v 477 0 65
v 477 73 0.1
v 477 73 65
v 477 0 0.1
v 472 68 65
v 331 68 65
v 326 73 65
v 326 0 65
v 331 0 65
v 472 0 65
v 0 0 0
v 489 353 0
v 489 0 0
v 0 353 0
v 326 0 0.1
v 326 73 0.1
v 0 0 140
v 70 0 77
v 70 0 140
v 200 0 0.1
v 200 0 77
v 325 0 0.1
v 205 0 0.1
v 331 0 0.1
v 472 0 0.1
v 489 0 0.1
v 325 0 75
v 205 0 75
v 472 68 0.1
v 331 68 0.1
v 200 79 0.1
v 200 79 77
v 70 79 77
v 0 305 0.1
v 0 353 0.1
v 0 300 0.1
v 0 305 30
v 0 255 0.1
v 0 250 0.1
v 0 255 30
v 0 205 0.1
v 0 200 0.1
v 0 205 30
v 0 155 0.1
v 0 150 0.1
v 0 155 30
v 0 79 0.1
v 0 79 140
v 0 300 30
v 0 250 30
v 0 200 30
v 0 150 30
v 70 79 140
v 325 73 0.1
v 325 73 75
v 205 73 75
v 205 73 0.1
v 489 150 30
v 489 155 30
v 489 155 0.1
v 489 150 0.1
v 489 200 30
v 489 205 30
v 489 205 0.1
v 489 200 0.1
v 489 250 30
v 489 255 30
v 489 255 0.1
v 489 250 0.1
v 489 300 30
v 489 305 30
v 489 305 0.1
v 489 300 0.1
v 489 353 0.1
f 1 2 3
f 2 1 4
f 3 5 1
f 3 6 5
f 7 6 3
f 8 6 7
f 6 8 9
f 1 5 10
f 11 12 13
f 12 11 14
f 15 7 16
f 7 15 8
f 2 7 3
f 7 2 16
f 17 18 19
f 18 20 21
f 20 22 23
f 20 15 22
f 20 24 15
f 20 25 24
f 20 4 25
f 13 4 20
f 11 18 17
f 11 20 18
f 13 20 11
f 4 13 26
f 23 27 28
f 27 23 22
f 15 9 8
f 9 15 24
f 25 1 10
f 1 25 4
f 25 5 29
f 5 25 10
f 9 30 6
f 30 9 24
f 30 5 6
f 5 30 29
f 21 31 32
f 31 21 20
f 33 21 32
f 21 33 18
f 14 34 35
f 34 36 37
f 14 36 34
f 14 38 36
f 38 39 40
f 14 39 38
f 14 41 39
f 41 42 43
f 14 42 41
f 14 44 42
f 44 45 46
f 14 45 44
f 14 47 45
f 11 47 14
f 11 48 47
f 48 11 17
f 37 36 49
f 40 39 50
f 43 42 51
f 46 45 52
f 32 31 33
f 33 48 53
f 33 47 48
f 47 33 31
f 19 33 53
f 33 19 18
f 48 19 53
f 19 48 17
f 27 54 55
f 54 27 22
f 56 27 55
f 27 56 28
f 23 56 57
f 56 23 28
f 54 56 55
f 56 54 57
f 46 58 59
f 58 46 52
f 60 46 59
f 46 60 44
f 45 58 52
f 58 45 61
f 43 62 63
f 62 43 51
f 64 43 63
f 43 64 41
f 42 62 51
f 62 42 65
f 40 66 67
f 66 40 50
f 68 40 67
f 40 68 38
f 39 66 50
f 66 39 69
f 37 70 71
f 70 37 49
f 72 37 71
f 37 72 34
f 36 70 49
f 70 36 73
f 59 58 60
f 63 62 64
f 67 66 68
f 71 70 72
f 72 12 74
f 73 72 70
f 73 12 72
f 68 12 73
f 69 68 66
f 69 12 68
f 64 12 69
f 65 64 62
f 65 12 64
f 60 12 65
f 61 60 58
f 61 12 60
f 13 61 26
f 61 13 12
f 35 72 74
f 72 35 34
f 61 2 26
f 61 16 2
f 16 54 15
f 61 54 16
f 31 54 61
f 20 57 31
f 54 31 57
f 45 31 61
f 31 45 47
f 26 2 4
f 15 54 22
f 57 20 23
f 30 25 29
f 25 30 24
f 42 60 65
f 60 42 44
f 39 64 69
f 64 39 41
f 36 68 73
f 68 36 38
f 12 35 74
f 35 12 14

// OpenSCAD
wall=[489, 353];

module walls() {
    cube([wall[0],wall[1],.1]);//TODO
}

module desk1() {
   difference(){
      cube([151,73,65]);
      translate([5, -0.1, 0])
        cube([141, 68.1, 65.1]);
   }
}

module desk2() {
    cube([120, 73, 75]);
}

module desk3() {
    union(){
        cube([200, 79, 77]);
        cube([70, 79, 140]);
    }
} 

module desks() {
    translate([wall[0]-12-151,0,0])
        desk1();
    translate([wall[0]-164-120, 0,0])
        desk2();
    translate([wall[0]-164-125-200,0 ,0])
        desk3();
}

module shelf1(offset, depth) {
    translate([0, 150+offset, 0])
        cube([wall[0]/3, 5, depth]);
}

module shelves() {
    colors=["darkred","green","darkblue"];
    for (col=[0:2])
        color(colors[col])
        translate([wall[0]/3*col, 0, 0])
        for (row=[0:3])
            shelf1(row*50, 30);
}

walls();
color("blue")
    desks();
shelves();
